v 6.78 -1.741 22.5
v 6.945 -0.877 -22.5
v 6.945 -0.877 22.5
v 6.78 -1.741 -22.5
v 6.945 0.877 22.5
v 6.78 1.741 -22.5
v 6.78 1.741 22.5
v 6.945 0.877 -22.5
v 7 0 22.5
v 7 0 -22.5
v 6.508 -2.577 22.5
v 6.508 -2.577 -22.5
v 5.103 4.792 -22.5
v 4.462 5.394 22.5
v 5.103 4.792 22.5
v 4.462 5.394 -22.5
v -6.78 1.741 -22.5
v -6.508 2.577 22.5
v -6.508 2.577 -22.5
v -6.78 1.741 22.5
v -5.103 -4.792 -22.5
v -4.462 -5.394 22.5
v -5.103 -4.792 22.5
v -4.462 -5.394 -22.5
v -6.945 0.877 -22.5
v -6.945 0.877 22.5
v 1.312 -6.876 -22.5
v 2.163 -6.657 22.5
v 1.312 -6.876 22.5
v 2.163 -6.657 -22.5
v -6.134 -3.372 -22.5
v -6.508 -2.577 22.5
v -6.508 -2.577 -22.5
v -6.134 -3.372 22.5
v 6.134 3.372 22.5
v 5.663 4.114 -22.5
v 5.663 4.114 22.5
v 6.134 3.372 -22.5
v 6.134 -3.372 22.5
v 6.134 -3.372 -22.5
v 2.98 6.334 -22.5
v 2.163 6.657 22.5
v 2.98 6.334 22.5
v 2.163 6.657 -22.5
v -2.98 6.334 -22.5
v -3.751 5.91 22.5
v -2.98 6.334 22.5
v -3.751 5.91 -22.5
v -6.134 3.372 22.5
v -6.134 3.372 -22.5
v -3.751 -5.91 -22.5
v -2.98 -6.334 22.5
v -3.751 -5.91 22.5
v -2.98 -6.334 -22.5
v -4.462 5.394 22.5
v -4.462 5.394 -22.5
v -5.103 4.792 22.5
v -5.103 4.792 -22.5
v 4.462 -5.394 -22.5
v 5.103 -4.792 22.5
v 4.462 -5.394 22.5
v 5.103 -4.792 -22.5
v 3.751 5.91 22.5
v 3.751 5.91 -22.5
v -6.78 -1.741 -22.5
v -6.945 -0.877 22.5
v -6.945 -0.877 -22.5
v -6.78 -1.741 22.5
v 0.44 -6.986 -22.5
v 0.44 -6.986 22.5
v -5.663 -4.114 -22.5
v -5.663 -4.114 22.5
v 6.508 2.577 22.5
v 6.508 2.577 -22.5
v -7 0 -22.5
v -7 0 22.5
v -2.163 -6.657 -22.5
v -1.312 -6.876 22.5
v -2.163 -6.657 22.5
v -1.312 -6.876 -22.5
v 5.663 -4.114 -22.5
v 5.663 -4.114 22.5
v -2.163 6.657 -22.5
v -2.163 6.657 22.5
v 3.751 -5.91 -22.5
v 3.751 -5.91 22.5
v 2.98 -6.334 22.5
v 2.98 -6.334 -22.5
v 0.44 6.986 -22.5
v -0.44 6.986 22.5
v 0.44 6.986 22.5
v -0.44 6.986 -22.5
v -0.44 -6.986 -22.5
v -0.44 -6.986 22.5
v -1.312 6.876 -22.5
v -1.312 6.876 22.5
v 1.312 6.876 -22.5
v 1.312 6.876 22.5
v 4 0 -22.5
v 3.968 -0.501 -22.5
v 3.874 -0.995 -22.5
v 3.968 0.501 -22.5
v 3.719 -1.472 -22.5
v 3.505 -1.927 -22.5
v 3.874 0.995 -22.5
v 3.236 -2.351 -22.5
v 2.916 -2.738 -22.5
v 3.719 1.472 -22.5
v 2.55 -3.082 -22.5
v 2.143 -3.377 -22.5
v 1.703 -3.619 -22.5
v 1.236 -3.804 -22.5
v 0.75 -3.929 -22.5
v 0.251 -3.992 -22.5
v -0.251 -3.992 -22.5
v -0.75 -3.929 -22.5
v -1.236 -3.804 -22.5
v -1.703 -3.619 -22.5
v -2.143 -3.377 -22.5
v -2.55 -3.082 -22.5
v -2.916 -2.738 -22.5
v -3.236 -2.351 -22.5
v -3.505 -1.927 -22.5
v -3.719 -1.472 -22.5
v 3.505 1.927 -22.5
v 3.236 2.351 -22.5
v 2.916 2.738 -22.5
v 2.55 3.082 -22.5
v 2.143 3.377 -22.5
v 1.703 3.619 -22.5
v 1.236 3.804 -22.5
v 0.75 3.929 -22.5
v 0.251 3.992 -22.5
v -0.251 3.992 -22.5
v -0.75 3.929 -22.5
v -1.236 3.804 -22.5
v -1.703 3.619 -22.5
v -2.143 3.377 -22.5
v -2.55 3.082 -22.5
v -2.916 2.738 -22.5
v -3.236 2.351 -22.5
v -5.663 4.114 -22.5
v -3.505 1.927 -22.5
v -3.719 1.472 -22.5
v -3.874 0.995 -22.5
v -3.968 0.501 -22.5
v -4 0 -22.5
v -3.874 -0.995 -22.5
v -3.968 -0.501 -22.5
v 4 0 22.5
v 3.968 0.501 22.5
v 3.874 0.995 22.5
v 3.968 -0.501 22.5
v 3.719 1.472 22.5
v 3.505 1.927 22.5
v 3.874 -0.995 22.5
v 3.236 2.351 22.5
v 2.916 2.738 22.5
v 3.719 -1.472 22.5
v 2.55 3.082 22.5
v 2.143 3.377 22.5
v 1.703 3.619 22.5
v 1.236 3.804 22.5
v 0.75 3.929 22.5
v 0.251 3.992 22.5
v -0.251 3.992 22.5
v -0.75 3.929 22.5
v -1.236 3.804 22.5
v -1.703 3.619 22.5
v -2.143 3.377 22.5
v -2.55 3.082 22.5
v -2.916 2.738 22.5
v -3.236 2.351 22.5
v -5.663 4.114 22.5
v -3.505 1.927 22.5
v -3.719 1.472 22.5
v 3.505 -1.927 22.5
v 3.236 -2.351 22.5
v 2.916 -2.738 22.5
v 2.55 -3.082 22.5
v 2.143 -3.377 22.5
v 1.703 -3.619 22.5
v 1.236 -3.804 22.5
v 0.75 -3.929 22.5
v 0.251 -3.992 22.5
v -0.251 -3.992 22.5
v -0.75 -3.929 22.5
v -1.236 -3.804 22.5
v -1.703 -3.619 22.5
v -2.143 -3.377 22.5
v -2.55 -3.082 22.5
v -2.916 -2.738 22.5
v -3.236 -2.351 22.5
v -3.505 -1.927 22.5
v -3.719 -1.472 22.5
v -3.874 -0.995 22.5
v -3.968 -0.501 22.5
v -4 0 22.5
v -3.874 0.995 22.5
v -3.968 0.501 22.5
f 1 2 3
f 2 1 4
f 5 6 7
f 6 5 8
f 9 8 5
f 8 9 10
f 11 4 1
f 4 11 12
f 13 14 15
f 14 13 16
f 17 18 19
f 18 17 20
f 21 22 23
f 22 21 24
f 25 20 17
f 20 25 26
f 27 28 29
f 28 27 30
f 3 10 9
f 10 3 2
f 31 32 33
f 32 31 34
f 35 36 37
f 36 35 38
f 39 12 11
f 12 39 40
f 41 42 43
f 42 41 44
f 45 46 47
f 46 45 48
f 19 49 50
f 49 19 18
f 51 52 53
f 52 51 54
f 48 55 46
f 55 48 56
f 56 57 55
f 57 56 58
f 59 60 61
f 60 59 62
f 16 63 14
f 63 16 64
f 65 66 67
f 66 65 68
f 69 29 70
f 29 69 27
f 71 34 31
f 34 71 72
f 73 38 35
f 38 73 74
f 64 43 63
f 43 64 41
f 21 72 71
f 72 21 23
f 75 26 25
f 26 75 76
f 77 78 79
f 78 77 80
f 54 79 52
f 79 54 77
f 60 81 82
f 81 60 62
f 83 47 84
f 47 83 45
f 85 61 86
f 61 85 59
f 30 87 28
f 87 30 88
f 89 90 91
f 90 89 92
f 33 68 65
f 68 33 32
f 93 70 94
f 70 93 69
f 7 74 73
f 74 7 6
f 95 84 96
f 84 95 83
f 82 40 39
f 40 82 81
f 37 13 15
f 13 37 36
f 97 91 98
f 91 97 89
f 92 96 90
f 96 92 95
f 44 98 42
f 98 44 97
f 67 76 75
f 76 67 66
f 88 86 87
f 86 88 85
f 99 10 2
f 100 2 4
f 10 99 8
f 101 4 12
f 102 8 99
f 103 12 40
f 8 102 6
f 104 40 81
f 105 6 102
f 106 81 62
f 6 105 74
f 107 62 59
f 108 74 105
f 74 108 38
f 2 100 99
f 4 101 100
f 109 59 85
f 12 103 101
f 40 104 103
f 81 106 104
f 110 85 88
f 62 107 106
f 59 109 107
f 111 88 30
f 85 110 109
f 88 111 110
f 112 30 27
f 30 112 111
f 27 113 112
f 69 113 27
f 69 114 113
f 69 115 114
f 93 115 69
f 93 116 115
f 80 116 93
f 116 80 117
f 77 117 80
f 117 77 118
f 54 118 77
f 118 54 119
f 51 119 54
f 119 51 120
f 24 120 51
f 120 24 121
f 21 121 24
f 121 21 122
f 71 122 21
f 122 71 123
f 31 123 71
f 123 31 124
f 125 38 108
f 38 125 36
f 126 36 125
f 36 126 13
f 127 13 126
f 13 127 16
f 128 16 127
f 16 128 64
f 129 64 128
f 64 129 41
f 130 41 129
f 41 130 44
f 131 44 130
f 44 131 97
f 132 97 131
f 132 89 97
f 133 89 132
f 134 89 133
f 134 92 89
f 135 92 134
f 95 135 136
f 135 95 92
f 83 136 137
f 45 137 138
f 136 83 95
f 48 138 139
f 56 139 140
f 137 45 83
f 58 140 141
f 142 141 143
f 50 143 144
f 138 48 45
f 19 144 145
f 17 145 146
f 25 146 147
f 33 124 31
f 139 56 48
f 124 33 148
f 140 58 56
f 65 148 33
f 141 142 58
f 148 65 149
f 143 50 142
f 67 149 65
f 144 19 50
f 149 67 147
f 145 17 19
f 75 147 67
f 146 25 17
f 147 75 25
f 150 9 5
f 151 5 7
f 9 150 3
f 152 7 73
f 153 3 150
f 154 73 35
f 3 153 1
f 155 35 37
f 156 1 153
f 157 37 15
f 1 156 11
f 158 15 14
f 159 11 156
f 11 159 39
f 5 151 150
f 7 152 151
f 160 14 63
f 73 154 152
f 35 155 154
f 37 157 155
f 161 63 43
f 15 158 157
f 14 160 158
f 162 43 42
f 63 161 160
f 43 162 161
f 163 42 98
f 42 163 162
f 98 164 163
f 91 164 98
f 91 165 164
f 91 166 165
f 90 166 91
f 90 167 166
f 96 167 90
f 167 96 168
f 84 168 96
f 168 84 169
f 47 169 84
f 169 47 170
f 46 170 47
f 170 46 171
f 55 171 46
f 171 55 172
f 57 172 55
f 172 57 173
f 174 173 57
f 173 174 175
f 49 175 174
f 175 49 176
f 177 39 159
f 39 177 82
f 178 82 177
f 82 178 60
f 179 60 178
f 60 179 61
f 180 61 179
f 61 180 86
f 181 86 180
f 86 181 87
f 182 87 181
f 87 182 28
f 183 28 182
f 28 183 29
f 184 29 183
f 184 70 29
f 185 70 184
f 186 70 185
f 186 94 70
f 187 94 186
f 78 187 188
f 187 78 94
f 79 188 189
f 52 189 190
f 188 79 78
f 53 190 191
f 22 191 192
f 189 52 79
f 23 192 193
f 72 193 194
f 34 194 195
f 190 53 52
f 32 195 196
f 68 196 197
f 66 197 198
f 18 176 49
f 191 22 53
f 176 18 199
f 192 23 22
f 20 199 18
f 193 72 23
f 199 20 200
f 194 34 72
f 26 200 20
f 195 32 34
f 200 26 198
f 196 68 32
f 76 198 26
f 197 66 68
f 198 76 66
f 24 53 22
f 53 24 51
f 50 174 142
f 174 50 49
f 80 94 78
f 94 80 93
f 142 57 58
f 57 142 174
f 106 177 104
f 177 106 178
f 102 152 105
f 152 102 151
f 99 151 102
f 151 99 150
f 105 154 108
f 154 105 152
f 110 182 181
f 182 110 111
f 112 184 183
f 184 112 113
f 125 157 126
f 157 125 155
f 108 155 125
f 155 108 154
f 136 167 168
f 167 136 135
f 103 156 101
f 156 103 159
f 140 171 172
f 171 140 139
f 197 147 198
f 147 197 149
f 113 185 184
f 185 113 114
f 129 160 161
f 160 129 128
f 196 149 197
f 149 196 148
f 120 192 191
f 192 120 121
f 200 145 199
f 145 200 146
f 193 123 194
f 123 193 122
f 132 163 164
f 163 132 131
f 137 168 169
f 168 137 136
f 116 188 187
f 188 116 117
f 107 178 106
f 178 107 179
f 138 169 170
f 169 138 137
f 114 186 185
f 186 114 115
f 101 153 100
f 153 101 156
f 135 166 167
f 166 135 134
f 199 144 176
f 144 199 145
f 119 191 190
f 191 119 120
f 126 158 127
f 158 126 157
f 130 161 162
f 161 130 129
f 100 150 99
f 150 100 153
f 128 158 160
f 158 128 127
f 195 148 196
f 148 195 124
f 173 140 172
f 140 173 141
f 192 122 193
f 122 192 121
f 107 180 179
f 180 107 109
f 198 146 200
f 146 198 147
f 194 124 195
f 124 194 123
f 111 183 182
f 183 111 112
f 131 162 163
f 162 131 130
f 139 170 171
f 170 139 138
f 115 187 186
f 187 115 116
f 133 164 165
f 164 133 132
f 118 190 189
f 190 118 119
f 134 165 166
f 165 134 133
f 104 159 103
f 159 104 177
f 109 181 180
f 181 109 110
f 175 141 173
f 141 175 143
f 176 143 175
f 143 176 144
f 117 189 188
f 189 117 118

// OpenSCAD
$fn = 50;


difference() {
	union() {
		translate(v = [0, 0, -22.5000000000]) {
			cylinder(h = 45, r = 7.0000000000);
		}
	}
	union() {
		translate(v = [0, 0, -100.0000000000]) {
			cylinder(h = 200, r = 4.0000000000);
		}
	}
}
